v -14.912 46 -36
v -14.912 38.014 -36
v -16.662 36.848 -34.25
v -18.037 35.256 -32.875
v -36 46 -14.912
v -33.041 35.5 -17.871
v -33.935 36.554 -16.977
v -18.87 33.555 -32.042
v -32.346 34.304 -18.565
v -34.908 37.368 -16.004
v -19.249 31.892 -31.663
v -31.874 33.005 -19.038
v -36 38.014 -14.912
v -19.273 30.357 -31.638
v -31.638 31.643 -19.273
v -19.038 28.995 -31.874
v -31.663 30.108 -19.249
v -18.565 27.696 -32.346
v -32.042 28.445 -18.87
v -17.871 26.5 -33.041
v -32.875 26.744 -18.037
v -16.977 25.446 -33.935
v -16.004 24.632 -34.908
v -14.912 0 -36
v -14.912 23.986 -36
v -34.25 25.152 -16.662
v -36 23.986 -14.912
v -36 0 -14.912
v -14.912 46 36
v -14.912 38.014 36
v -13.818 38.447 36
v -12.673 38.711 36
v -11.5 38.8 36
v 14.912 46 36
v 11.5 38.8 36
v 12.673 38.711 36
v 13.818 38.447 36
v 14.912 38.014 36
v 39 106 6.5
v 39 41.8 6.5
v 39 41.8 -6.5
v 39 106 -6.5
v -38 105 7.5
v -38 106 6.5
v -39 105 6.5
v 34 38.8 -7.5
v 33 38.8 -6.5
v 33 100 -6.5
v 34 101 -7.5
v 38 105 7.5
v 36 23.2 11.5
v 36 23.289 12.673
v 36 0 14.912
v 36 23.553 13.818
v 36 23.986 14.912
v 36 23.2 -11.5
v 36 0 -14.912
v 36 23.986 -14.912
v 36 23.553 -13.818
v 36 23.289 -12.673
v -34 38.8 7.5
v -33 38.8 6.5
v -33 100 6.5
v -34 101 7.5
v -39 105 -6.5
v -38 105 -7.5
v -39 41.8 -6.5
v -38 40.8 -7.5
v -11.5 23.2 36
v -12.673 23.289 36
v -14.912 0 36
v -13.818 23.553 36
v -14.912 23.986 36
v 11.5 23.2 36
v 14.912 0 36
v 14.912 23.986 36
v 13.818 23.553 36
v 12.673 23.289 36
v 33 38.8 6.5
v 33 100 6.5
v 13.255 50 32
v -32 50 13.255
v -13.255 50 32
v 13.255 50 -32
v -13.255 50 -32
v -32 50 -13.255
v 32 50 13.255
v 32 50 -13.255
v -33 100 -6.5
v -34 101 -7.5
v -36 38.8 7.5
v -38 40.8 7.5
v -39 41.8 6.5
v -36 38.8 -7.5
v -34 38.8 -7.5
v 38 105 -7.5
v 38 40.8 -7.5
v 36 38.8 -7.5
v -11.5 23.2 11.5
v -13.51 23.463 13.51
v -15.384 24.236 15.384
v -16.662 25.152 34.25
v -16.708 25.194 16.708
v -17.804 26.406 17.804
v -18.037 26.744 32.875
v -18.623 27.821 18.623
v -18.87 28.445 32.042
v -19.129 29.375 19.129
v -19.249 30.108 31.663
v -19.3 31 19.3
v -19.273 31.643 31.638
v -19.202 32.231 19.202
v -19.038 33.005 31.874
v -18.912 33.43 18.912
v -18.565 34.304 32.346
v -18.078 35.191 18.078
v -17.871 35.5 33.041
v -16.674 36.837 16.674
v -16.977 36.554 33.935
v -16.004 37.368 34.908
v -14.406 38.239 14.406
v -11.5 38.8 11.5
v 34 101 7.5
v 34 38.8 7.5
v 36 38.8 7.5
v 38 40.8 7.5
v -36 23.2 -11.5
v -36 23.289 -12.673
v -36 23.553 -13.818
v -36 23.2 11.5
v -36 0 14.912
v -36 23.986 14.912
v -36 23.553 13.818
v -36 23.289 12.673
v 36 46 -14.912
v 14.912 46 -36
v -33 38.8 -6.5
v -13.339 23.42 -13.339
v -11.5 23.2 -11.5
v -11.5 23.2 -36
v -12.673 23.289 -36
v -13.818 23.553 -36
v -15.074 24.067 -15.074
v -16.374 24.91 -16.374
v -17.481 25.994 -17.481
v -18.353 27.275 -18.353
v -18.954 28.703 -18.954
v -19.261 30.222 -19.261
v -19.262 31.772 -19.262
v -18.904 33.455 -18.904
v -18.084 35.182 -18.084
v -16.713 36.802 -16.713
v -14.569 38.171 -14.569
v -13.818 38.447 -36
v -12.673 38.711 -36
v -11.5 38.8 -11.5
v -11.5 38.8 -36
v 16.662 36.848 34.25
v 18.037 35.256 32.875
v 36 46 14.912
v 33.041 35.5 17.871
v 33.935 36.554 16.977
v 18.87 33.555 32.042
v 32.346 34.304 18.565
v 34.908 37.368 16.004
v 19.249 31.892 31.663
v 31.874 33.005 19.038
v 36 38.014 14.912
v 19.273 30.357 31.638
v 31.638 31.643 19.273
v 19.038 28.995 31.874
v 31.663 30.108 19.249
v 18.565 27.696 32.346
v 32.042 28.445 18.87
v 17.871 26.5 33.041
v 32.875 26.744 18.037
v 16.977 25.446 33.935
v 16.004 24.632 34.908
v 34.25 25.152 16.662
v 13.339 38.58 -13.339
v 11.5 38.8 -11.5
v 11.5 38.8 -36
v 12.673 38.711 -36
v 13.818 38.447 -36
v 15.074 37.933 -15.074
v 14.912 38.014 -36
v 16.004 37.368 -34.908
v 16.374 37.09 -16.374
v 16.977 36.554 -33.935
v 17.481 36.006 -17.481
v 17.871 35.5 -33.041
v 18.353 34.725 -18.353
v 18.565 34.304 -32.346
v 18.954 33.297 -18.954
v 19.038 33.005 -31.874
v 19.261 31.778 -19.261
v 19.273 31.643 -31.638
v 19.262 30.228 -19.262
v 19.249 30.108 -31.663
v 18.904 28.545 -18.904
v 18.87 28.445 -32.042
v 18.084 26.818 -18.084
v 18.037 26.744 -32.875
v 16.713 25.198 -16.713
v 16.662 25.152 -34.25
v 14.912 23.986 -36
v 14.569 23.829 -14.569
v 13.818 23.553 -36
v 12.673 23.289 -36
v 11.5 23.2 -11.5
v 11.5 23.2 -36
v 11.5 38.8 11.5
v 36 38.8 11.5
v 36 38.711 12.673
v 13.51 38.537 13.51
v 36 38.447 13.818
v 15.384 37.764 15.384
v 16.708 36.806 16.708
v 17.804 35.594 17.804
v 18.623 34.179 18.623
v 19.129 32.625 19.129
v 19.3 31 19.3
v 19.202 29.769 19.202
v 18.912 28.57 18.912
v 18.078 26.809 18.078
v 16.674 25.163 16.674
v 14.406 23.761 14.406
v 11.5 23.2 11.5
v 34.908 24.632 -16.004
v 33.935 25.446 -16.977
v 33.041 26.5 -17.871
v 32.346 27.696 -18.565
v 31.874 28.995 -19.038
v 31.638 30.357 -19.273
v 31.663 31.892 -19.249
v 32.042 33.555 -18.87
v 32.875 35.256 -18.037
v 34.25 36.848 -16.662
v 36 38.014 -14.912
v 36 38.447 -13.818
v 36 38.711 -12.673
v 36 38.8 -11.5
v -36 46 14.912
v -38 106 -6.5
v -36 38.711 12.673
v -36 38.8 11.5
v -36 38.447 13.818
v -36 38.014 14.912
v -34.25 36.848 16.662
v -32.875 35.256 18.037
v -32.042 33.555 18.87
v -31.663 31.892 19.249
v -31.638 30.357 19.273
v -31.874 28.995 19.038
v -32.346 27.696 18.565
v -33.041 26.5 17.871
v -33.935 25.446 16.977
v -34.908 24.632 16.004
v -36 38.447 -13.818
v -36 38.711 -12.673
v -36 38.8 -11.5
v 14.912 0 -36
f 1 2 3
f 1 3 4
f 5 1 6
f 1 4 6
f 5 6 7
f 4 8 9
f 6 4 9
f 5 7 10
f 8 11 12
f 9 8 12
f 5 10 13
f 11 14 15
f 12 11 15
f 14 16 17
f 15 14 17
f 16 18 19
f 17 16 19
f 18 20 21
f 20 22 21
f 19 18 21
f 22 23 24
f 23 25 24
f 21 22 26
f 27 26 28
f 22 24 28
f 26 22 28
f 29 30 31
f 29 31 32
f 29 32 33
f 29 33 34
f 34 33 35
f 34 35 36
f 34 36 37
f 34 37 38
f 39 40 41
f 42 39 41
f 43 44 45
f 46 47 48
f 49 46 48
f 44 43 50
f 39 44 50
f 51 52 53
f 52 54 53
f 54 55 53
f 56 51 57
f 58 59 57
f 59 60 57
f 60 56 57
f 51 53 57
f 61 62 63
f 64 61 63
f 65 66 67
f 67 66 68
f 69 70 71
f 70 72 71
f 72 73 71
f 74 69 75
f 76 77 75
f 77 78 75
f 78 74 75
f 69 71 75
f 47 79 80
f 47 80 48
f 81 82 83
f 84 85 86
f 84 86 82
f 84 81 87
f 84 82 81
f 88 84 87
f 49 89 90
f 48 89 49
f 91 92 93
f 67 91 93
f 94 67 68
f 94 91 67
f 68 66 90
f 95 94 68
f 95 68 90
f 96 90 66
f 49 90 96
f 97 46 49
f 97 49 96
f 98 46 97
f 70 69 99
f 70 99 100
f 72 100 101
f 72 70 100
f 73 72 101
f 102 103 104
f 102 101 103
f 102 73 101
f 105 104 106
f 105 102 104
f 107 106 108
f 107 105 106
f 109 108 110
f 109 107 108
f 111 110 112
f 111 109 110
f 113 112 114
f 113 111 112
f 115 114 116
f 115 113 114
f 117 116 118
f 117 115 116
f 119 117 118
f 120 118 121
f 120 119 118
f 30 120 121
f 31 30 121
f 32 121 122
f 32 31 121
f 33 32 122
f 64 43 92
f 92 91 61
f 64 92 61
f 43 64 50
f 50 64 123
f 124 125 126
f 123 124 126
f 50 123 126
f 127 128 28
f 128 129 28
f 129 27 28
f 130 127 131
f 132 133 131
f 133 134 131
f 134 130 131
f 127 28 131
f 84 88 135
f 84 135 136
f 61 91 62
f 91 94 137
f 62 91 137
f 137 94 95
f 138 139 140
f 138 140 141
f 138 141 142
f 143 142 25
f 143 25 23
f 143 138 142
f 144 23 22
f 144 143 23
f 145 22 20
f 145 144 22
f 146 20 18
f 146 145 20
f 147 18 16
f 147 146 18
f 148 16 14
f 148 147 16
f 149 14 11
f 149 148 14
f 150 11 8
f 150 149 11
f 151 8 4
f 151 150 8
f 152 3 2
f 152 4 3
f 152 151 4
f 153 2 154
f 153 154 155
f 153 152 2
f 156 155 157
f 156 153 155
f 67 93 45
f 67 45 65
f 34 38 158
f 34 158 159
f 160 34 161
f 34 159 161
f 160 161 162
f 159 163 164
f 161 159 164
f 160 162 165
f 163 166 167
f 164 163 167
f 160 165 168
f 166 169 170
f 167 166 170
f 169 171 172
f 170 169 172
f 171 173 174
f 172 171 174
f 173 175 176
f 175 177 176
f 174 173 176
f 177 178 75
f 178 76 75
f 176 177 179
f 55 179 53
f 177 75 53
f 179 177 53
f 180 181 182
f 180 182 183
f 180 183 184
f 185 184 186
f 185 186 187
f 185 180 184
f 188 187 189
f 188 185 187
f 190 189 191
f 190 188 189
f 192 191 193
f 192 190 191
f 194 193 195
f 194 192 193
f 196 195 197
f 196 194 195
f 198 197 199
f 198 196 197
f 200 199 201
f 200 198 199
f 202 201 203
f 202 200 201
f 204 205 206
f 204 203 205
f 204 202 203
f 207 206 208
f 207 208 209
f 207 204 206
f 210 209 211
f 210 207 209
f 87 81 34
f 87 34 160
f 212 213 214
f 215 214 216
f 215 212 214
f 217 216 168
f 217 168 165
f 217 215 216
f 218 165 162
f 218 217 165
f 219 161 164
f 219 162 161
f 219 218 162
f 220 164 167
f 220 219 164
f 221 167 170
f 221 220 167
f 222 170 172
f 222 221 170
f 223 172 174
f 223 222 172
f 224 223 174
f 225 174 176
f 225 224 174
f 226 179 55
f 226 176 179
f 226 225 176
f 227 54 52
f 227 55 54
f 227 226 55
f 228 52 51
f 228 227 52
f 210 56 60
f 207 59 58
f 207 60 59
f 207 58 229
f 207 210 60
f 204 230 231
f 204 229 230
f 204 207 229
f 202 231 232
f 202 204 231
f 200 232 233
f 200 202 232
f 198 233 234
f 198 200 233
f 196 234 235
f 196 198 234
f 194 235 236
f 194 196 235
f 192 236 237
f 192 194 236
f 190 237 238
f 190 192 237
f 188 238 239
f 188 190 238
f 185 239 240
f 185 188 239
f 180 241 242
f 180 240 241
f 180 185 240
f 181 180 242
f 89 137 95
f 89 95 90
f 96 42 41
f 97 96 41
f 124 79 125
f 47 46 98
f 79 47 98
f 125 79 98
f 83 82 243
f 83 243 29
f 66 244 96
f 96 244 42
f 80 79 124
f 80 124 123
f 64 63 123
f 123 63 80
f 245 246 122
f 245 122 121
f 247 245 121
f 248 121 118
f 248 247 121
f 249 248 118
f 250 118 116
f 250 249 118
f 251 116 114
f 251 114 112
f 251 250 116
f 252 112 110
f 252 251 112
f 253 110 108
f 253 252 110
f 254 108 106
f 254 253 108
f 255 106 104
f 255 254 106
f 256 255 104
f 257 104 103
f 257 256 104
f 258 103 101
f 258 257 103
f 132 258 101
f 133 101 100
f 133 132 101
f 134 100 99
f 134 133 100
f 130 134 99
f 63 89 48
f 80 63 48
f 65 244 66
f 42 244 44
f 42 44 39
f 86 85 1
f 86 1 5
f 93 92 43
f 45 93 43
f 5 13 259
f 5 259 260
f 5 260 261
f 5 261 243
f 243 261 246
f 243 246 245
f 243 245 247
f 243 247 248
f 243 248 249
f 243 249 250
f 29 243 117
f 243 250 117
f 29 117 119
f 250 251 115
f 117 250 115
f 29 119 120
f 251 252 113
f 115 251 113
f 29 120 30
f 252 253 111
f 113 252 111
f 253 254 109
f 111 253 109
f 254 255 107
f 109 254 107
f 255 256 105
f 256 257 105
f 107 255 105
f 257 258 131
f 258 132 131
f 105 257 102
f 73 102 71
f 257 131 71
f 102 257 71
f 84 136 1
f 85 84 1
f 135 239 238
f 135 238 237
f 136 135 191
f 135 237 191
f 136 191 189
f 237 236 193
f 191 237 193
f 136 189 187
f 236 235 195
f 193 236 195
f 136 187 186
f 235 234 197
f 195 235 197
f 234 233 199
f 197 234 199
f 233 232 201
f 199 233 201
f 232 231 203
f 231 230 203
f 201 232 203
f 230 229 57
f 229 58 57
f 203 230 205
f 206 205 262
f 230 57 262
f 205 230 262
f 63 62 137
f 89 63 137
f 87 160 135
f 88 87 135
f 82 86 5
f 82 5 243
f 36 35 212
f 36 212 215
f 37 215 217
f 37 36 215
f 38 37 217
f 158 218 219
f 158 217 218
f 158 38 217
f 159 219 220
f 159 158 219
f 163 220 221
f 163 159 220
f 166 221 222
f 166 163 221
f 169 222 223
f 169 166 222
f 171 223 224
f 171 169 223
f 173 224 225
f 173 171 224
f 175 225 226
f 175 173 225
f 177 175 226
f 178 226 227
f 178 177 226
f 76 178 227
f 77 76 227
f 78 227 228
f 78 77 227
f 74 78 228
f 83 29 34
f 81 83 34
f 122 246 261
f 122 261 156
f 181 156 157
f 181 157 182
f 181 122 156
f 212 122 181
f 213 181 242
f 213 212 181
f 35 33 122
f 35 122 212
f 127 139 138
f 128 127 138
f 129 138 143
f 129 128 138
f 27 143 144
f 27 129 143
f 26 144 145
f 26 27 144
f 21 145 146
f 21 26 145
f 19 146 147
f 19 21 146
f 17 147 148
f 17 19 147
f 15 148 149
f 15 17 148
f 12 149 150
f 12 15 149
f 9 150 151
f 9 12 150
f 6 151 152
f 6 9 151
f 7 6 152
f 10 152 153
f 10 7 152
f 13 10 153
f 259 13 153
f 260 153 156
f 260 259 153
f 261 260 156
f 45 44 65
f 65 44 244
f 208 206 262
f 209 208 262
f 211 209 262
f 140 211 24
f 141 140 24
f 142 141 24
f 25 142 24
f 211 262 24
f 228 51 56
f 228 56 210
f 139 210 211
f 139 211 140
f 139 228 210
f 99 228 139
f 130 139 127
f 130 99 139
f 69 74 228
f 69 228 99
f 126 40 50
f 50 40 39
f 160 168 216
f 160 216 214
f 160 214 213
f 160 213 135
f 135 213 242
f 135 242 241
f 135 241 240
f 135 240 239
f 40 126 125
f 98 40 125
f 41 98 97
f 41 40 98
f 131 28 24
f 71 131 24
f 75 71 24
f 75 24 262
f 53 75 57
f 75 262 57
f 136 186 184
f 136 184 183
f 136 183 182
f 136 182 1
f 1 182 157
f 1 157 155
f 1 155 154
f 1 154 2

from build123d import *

# Parameters (mm, degrees)
BOSS_EXTRUDE1_DEPTH         = 50
CUT_EXTRUDE1_DEPTH          = 72
CUT_EXTRUDE2_REACH          = 96.763
CHAMFER10_SIZE              = 4
BOSS_EXTRUDE10_DEPTH        = 50
BOSS_EXTRUDE10_DEPTH_BACK   = 11.2
SKETCH18_W                  = 6
SKETCH18_H                  = 15
BOSS_EXTRUDE10_2_DEPTH      = 50
BOSS_EXTRUDE10_2_DEPTH_BACK = 11.2
SKETCH20_W                  = 78
SKETCH20_H                  = 15
BOSS_EXTRUDE11_DEPTH        = 6
CHAMFER8_SIZE               = 3
CHAMFER9_SIZE               = 1


with BuildPart() as part:
    # Sketch1 → Boss-Extrude1 (new body)
    with BuildSketch(Plane(origin=(0, 0, 0), x_dir=(1, 0, 0), z_dir=(0, 1, 0))):
        Polygon((14.911688245, 36), (-14.911688245, 36), (-36, 14.911688245), (-36, -14.911688245), (-14.911688245, -36), (14.911688245, -36), (36, -14.911688245), (36, 14.911688245), align=None)
    extrude(amount=BOSS_EXTRUDE1_DEPTH)

    # Sketch3 → Cut-Extrude1 (cut)
    with BuildSketch(Plane.XY.offset(36)):
        with BuildLine():
            Line((-11.5, 38.8), (11.5, 38.8))
            ThreePointArc((11.5, 38.8), (19.3, 31), (11.5, 23.2))
            Line((11.5, 23.2), (-11.5, 23.2))
            ThreePointArc((-11.5, 23.2), (-19.3, 31), (-11.5, 38.8))
        make_face()
    extrude(amount=-CUT_EXTRUDE1_DEPTH, mode=Mode.SUBTRACT)

    # Cut-Extrude2: up to this face of the body (flat: up to its plane)
    cut_extrude2_end = Plane(part.part.faces().sort_by_distance((36, 25, 0))[0])
    # Sketch4 → Cut-Extrude2 (cut, up to the picked face)
    with BuildSketch(Plane.ZY.offset(36), mode=Mode.PRIVATE) as cut_extrude2_sk1:
        with BuildLine():
            Line((-11.5, 38.8), (11.5, 38.8))
            ThreePointArc((11.5, 38.8), (19.3, 31), (11.5, 23.2))
            Line((11.5, 23.2), (-11.5, 23.2))
            ThreePointArc((-11.5, 23.2), (-19.3, 31), (-11.5, 38.8))
        make_face()
    cut_extrude2_tool1 = split(extrude(cut_extrude2_sk1.sketch, amount=-CUT_EXTRUDE2_REACH, mode=Mode.PRIVATE), bisect_by=cut_extrude2_end, keep=Keep.BOTH, mode=Mode.PRIVATE)
    add(cut_extrude2_tool1.solids().sort_by(Axis((-36, 31, 0), (1, 0, 0)))[0], mode=Mode.SUBTRACT)

    # Chamfer10
    chamfer10_edges = [part.edges().sort_by_distance(p)[0] for p in [
        (-25.455844123, 50, -25.455844123),
        (-36, 50, 0),
        (-25.455844123, 50, 25.455844123),
        (0, 50, 36),
        (25.455844123, 50, 25.455844123),
        (36, 50, 0),
        (25.455844123, 50, -25.455844123),
        (0, 50, -36),
    ]]
    chamfer(chamfer10_edges, length=CHAMFER10_SIZE)


with BuildPart() as body_2:
    # Sketch18 → Boss-Extrude10 (new, two sides: drawn at the far end of the back side and taken through both)
    with BuildSketch(Plane(origin=(0, 50, 0), x_dir=(1, 0, 0), z_dir=(0, 1, 0)).offset(-BOSS_EXTRUDE10_DEPTH_BACK)):
        with Locations((-36, 0)):
            Rectangle(SKETCH18_W, SKETCH18_H)
    extrude(amount=BOSS_EXTRUDE10_DEPTH + BOSS_EXTRUDE10_DEPTH_BACK)



with BuildPart() as body_3:
    # Sketch18 → Boss-Extrude10 2 (new, two sides: drawn at the far end of the back side and taken through both)
    with BuildSketch(Plane(origin=(0, 50, 0), x_dir=(1, 0, 0), z_dir=(0, 1, 0)).offset(-BOSS_EXTRUDE10_2_DEPTH_BACK)):
        with Locations((36, 0)):
            Rectangle(SKETCH18_W, SKETCH18_H)
    extrude(amount=BOSS_EXTRUDE10_2_DEPTH + BOSS_EXTRUDE10_2_DEPTH_BACK)


with BuildPart() as body_2_1:
    add(body_2.part)

    add(body_3.part)  # Boss-Extrude11 merges body 3
    # Sketch20 → Boss-Extrude11 (add)
    with BuildSketch(Plane(origin=(0, 100, 0), x_dir=(1, 0, 0), z_dir=(0, 1, 0))):
        Rectangle(SKETCH20_W, SKETCH20_H)
    extrude(amount=BOSS_EXTRUDE11_DEPTH)

    # Chamfer8
    chamfer8_edges = [body_2_1.edges().sort_by_distance(p)[0] for p in [
        (-39, 38.8, 0),
        (39, 38.8, 0),
    ]]
    chamfer(chamfer8_edges, length=CHAMFER8_SIZE)

    # Chamfer9
    chamfer9_edges = [body_2_1.edges().sort_by_distance(p)[0] for p in [
        (-33, 69.4, 7.5),
        (-33, 69.4, -7.5),
        (0, 100, 7.5),
        (39, 73.9, 7.5),
        (39, 73.9, -7.5),
        (-39, 106, 0),
        (0, 106, 7.5),
        (0, 106, -7.5),
        (0, 100, -7.5),
        (33, 69.4, -7.5),
        (33, 69.4, 7.5),
        (-39, 73.9, 7.5),
        (-39, 73.9, -7.5),
    ]]
    chamfer(chamfer9_edges, length=CHAMFER9_SIZE)


solid = Compound([part.part, body_2_1.part])
